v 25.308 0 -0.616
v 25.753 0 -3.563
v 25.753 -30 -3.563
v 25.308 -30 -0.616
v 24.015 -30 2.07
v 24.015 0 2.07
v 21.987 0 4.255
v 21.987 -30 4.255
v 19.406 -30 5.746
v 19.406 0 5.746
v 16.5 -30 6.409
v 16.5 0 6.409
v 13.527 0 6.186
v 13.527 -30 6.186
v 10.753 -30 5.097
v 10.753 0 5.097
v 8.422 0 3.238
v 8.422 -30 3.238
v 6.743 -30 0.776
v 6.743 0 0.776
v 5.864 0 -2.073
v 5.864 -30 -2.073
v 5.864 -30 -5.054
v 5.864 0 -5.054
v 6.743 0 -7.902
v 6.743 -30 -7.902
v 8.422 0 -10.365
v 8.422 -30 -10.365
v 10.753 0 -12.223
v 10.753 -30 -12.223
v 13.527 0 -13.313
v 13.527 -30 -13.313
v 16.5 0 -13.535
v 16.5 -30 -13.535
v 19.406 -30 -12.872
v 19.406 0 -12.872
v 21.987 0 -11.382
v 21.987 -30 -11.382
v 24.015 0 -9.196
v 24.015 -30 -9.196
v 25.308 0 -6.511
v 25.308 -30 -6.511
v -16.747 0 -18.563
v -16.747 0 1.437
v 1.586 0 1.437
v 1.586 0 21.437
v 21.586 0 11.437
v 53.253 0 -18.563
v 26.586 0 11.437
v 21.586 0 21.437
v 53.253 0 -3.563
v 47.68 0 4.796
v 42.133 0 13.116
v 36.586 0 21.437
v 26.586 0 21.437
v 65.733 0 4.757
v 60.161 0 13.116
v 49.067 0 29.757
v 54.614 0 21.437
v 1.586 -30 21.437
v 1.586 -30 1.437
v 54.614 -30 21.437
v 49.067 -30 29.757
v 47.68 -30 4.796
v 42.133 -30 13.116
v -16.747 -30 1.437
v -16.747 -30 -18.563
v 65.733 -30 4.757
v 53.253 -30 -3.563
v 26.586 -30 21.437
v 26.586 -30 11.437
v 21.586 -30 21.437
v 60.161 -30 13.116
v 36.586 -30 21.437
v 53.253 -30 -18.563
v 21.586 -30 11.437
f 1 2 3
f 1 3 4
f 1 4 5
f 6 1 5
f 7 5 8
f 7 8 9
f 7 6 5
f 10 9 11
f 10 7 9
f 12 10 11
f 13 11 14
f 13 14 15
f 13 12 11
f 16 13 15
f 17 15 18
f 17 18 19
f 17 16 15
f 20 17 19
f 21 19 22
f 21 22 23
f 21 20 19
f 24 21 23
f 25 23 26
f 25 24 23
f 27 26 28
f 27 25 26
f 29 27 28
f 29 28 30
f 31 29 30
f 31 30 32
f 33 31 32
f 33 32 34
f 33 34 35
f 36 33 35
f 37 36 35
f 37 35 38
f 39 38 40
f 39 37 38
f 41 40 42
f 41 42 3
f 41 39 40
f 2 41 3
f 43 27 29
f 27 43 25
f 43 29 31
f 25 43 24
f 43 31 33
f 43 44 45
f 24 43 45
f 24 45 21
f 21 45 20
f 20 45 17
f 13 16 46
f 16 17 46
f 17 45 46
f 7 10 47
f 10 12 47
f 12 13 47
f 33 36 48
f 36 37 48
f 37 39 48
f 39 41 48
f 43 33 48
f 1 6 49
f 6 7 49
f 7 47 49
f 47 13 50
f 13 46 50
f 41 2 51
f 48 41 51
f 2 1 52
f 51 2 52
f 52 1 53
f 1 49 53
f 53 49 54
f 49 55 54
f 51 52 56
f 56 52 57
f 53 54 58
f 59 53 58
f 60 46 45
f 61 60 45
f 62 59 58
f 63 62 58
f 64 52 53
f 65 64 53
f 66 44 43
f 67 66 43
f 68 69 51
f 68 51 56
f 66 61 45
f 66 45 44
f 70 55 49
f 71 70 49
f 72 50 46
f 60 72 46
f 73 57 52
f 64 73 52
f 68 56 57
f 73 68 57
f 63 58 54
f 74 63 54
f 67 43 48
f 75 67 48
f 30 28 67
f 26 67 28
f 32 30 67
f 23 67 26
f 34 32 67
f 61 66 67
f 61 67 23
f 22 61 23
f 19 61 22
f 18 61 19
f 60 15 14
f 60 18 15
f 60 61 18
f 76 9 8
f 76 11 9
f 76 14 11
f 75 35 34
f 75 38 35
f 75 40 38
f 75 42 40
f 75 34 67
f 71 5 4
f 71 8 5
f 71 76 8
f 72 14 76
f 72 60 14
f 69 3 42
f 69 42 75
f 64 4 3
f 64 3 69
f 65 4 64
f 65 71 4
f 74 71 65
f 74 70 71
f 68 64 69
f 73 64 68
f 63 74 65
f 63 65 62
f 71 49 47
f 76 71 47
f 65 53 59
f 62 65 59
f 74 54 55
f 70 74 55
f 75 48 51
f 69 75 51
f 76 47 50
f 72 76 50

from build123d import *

# Parameters (mm, degrees)
F0_R     = 10
F1_DEPTH = 30


with BuildPart() as f1:
    # F0 (on Front) → F1 (new body)
    with BuildSketch(Plane.XZ):
        Polygon((21.585897, 21.436766), (1.585897, 21.436766), (1.585897, 1.436766), (-16.747437, 1.436766), (-16.747437, -18.563234), (53.252563, -18.563234), (53.252563, -3.563234), (47.679901, 4.795761), (42.132899, 13.116264), (36.585897, 21.436766), (26.585897, 21.436766), (26.585897, 11.436766), (21.585897, 11.436766), align=None)
        with Locations((15.752563, -3.563234)):
            Circle(F0_R, mode=Mode.SUBTRACT)
        Polygon((49.066651, 29.757269), (36.585897, 21.436766), (42.132899, 13.116264), (54.613653, 21.436766), align=None)
        Polygon((47.679901, 4.795761), (53.252563, -3.563234), (65.733318, 4.757269), (60.160655, 13.116264), align=None)
    extrude(amount=F1_DEPTH)


solid = f1.part
